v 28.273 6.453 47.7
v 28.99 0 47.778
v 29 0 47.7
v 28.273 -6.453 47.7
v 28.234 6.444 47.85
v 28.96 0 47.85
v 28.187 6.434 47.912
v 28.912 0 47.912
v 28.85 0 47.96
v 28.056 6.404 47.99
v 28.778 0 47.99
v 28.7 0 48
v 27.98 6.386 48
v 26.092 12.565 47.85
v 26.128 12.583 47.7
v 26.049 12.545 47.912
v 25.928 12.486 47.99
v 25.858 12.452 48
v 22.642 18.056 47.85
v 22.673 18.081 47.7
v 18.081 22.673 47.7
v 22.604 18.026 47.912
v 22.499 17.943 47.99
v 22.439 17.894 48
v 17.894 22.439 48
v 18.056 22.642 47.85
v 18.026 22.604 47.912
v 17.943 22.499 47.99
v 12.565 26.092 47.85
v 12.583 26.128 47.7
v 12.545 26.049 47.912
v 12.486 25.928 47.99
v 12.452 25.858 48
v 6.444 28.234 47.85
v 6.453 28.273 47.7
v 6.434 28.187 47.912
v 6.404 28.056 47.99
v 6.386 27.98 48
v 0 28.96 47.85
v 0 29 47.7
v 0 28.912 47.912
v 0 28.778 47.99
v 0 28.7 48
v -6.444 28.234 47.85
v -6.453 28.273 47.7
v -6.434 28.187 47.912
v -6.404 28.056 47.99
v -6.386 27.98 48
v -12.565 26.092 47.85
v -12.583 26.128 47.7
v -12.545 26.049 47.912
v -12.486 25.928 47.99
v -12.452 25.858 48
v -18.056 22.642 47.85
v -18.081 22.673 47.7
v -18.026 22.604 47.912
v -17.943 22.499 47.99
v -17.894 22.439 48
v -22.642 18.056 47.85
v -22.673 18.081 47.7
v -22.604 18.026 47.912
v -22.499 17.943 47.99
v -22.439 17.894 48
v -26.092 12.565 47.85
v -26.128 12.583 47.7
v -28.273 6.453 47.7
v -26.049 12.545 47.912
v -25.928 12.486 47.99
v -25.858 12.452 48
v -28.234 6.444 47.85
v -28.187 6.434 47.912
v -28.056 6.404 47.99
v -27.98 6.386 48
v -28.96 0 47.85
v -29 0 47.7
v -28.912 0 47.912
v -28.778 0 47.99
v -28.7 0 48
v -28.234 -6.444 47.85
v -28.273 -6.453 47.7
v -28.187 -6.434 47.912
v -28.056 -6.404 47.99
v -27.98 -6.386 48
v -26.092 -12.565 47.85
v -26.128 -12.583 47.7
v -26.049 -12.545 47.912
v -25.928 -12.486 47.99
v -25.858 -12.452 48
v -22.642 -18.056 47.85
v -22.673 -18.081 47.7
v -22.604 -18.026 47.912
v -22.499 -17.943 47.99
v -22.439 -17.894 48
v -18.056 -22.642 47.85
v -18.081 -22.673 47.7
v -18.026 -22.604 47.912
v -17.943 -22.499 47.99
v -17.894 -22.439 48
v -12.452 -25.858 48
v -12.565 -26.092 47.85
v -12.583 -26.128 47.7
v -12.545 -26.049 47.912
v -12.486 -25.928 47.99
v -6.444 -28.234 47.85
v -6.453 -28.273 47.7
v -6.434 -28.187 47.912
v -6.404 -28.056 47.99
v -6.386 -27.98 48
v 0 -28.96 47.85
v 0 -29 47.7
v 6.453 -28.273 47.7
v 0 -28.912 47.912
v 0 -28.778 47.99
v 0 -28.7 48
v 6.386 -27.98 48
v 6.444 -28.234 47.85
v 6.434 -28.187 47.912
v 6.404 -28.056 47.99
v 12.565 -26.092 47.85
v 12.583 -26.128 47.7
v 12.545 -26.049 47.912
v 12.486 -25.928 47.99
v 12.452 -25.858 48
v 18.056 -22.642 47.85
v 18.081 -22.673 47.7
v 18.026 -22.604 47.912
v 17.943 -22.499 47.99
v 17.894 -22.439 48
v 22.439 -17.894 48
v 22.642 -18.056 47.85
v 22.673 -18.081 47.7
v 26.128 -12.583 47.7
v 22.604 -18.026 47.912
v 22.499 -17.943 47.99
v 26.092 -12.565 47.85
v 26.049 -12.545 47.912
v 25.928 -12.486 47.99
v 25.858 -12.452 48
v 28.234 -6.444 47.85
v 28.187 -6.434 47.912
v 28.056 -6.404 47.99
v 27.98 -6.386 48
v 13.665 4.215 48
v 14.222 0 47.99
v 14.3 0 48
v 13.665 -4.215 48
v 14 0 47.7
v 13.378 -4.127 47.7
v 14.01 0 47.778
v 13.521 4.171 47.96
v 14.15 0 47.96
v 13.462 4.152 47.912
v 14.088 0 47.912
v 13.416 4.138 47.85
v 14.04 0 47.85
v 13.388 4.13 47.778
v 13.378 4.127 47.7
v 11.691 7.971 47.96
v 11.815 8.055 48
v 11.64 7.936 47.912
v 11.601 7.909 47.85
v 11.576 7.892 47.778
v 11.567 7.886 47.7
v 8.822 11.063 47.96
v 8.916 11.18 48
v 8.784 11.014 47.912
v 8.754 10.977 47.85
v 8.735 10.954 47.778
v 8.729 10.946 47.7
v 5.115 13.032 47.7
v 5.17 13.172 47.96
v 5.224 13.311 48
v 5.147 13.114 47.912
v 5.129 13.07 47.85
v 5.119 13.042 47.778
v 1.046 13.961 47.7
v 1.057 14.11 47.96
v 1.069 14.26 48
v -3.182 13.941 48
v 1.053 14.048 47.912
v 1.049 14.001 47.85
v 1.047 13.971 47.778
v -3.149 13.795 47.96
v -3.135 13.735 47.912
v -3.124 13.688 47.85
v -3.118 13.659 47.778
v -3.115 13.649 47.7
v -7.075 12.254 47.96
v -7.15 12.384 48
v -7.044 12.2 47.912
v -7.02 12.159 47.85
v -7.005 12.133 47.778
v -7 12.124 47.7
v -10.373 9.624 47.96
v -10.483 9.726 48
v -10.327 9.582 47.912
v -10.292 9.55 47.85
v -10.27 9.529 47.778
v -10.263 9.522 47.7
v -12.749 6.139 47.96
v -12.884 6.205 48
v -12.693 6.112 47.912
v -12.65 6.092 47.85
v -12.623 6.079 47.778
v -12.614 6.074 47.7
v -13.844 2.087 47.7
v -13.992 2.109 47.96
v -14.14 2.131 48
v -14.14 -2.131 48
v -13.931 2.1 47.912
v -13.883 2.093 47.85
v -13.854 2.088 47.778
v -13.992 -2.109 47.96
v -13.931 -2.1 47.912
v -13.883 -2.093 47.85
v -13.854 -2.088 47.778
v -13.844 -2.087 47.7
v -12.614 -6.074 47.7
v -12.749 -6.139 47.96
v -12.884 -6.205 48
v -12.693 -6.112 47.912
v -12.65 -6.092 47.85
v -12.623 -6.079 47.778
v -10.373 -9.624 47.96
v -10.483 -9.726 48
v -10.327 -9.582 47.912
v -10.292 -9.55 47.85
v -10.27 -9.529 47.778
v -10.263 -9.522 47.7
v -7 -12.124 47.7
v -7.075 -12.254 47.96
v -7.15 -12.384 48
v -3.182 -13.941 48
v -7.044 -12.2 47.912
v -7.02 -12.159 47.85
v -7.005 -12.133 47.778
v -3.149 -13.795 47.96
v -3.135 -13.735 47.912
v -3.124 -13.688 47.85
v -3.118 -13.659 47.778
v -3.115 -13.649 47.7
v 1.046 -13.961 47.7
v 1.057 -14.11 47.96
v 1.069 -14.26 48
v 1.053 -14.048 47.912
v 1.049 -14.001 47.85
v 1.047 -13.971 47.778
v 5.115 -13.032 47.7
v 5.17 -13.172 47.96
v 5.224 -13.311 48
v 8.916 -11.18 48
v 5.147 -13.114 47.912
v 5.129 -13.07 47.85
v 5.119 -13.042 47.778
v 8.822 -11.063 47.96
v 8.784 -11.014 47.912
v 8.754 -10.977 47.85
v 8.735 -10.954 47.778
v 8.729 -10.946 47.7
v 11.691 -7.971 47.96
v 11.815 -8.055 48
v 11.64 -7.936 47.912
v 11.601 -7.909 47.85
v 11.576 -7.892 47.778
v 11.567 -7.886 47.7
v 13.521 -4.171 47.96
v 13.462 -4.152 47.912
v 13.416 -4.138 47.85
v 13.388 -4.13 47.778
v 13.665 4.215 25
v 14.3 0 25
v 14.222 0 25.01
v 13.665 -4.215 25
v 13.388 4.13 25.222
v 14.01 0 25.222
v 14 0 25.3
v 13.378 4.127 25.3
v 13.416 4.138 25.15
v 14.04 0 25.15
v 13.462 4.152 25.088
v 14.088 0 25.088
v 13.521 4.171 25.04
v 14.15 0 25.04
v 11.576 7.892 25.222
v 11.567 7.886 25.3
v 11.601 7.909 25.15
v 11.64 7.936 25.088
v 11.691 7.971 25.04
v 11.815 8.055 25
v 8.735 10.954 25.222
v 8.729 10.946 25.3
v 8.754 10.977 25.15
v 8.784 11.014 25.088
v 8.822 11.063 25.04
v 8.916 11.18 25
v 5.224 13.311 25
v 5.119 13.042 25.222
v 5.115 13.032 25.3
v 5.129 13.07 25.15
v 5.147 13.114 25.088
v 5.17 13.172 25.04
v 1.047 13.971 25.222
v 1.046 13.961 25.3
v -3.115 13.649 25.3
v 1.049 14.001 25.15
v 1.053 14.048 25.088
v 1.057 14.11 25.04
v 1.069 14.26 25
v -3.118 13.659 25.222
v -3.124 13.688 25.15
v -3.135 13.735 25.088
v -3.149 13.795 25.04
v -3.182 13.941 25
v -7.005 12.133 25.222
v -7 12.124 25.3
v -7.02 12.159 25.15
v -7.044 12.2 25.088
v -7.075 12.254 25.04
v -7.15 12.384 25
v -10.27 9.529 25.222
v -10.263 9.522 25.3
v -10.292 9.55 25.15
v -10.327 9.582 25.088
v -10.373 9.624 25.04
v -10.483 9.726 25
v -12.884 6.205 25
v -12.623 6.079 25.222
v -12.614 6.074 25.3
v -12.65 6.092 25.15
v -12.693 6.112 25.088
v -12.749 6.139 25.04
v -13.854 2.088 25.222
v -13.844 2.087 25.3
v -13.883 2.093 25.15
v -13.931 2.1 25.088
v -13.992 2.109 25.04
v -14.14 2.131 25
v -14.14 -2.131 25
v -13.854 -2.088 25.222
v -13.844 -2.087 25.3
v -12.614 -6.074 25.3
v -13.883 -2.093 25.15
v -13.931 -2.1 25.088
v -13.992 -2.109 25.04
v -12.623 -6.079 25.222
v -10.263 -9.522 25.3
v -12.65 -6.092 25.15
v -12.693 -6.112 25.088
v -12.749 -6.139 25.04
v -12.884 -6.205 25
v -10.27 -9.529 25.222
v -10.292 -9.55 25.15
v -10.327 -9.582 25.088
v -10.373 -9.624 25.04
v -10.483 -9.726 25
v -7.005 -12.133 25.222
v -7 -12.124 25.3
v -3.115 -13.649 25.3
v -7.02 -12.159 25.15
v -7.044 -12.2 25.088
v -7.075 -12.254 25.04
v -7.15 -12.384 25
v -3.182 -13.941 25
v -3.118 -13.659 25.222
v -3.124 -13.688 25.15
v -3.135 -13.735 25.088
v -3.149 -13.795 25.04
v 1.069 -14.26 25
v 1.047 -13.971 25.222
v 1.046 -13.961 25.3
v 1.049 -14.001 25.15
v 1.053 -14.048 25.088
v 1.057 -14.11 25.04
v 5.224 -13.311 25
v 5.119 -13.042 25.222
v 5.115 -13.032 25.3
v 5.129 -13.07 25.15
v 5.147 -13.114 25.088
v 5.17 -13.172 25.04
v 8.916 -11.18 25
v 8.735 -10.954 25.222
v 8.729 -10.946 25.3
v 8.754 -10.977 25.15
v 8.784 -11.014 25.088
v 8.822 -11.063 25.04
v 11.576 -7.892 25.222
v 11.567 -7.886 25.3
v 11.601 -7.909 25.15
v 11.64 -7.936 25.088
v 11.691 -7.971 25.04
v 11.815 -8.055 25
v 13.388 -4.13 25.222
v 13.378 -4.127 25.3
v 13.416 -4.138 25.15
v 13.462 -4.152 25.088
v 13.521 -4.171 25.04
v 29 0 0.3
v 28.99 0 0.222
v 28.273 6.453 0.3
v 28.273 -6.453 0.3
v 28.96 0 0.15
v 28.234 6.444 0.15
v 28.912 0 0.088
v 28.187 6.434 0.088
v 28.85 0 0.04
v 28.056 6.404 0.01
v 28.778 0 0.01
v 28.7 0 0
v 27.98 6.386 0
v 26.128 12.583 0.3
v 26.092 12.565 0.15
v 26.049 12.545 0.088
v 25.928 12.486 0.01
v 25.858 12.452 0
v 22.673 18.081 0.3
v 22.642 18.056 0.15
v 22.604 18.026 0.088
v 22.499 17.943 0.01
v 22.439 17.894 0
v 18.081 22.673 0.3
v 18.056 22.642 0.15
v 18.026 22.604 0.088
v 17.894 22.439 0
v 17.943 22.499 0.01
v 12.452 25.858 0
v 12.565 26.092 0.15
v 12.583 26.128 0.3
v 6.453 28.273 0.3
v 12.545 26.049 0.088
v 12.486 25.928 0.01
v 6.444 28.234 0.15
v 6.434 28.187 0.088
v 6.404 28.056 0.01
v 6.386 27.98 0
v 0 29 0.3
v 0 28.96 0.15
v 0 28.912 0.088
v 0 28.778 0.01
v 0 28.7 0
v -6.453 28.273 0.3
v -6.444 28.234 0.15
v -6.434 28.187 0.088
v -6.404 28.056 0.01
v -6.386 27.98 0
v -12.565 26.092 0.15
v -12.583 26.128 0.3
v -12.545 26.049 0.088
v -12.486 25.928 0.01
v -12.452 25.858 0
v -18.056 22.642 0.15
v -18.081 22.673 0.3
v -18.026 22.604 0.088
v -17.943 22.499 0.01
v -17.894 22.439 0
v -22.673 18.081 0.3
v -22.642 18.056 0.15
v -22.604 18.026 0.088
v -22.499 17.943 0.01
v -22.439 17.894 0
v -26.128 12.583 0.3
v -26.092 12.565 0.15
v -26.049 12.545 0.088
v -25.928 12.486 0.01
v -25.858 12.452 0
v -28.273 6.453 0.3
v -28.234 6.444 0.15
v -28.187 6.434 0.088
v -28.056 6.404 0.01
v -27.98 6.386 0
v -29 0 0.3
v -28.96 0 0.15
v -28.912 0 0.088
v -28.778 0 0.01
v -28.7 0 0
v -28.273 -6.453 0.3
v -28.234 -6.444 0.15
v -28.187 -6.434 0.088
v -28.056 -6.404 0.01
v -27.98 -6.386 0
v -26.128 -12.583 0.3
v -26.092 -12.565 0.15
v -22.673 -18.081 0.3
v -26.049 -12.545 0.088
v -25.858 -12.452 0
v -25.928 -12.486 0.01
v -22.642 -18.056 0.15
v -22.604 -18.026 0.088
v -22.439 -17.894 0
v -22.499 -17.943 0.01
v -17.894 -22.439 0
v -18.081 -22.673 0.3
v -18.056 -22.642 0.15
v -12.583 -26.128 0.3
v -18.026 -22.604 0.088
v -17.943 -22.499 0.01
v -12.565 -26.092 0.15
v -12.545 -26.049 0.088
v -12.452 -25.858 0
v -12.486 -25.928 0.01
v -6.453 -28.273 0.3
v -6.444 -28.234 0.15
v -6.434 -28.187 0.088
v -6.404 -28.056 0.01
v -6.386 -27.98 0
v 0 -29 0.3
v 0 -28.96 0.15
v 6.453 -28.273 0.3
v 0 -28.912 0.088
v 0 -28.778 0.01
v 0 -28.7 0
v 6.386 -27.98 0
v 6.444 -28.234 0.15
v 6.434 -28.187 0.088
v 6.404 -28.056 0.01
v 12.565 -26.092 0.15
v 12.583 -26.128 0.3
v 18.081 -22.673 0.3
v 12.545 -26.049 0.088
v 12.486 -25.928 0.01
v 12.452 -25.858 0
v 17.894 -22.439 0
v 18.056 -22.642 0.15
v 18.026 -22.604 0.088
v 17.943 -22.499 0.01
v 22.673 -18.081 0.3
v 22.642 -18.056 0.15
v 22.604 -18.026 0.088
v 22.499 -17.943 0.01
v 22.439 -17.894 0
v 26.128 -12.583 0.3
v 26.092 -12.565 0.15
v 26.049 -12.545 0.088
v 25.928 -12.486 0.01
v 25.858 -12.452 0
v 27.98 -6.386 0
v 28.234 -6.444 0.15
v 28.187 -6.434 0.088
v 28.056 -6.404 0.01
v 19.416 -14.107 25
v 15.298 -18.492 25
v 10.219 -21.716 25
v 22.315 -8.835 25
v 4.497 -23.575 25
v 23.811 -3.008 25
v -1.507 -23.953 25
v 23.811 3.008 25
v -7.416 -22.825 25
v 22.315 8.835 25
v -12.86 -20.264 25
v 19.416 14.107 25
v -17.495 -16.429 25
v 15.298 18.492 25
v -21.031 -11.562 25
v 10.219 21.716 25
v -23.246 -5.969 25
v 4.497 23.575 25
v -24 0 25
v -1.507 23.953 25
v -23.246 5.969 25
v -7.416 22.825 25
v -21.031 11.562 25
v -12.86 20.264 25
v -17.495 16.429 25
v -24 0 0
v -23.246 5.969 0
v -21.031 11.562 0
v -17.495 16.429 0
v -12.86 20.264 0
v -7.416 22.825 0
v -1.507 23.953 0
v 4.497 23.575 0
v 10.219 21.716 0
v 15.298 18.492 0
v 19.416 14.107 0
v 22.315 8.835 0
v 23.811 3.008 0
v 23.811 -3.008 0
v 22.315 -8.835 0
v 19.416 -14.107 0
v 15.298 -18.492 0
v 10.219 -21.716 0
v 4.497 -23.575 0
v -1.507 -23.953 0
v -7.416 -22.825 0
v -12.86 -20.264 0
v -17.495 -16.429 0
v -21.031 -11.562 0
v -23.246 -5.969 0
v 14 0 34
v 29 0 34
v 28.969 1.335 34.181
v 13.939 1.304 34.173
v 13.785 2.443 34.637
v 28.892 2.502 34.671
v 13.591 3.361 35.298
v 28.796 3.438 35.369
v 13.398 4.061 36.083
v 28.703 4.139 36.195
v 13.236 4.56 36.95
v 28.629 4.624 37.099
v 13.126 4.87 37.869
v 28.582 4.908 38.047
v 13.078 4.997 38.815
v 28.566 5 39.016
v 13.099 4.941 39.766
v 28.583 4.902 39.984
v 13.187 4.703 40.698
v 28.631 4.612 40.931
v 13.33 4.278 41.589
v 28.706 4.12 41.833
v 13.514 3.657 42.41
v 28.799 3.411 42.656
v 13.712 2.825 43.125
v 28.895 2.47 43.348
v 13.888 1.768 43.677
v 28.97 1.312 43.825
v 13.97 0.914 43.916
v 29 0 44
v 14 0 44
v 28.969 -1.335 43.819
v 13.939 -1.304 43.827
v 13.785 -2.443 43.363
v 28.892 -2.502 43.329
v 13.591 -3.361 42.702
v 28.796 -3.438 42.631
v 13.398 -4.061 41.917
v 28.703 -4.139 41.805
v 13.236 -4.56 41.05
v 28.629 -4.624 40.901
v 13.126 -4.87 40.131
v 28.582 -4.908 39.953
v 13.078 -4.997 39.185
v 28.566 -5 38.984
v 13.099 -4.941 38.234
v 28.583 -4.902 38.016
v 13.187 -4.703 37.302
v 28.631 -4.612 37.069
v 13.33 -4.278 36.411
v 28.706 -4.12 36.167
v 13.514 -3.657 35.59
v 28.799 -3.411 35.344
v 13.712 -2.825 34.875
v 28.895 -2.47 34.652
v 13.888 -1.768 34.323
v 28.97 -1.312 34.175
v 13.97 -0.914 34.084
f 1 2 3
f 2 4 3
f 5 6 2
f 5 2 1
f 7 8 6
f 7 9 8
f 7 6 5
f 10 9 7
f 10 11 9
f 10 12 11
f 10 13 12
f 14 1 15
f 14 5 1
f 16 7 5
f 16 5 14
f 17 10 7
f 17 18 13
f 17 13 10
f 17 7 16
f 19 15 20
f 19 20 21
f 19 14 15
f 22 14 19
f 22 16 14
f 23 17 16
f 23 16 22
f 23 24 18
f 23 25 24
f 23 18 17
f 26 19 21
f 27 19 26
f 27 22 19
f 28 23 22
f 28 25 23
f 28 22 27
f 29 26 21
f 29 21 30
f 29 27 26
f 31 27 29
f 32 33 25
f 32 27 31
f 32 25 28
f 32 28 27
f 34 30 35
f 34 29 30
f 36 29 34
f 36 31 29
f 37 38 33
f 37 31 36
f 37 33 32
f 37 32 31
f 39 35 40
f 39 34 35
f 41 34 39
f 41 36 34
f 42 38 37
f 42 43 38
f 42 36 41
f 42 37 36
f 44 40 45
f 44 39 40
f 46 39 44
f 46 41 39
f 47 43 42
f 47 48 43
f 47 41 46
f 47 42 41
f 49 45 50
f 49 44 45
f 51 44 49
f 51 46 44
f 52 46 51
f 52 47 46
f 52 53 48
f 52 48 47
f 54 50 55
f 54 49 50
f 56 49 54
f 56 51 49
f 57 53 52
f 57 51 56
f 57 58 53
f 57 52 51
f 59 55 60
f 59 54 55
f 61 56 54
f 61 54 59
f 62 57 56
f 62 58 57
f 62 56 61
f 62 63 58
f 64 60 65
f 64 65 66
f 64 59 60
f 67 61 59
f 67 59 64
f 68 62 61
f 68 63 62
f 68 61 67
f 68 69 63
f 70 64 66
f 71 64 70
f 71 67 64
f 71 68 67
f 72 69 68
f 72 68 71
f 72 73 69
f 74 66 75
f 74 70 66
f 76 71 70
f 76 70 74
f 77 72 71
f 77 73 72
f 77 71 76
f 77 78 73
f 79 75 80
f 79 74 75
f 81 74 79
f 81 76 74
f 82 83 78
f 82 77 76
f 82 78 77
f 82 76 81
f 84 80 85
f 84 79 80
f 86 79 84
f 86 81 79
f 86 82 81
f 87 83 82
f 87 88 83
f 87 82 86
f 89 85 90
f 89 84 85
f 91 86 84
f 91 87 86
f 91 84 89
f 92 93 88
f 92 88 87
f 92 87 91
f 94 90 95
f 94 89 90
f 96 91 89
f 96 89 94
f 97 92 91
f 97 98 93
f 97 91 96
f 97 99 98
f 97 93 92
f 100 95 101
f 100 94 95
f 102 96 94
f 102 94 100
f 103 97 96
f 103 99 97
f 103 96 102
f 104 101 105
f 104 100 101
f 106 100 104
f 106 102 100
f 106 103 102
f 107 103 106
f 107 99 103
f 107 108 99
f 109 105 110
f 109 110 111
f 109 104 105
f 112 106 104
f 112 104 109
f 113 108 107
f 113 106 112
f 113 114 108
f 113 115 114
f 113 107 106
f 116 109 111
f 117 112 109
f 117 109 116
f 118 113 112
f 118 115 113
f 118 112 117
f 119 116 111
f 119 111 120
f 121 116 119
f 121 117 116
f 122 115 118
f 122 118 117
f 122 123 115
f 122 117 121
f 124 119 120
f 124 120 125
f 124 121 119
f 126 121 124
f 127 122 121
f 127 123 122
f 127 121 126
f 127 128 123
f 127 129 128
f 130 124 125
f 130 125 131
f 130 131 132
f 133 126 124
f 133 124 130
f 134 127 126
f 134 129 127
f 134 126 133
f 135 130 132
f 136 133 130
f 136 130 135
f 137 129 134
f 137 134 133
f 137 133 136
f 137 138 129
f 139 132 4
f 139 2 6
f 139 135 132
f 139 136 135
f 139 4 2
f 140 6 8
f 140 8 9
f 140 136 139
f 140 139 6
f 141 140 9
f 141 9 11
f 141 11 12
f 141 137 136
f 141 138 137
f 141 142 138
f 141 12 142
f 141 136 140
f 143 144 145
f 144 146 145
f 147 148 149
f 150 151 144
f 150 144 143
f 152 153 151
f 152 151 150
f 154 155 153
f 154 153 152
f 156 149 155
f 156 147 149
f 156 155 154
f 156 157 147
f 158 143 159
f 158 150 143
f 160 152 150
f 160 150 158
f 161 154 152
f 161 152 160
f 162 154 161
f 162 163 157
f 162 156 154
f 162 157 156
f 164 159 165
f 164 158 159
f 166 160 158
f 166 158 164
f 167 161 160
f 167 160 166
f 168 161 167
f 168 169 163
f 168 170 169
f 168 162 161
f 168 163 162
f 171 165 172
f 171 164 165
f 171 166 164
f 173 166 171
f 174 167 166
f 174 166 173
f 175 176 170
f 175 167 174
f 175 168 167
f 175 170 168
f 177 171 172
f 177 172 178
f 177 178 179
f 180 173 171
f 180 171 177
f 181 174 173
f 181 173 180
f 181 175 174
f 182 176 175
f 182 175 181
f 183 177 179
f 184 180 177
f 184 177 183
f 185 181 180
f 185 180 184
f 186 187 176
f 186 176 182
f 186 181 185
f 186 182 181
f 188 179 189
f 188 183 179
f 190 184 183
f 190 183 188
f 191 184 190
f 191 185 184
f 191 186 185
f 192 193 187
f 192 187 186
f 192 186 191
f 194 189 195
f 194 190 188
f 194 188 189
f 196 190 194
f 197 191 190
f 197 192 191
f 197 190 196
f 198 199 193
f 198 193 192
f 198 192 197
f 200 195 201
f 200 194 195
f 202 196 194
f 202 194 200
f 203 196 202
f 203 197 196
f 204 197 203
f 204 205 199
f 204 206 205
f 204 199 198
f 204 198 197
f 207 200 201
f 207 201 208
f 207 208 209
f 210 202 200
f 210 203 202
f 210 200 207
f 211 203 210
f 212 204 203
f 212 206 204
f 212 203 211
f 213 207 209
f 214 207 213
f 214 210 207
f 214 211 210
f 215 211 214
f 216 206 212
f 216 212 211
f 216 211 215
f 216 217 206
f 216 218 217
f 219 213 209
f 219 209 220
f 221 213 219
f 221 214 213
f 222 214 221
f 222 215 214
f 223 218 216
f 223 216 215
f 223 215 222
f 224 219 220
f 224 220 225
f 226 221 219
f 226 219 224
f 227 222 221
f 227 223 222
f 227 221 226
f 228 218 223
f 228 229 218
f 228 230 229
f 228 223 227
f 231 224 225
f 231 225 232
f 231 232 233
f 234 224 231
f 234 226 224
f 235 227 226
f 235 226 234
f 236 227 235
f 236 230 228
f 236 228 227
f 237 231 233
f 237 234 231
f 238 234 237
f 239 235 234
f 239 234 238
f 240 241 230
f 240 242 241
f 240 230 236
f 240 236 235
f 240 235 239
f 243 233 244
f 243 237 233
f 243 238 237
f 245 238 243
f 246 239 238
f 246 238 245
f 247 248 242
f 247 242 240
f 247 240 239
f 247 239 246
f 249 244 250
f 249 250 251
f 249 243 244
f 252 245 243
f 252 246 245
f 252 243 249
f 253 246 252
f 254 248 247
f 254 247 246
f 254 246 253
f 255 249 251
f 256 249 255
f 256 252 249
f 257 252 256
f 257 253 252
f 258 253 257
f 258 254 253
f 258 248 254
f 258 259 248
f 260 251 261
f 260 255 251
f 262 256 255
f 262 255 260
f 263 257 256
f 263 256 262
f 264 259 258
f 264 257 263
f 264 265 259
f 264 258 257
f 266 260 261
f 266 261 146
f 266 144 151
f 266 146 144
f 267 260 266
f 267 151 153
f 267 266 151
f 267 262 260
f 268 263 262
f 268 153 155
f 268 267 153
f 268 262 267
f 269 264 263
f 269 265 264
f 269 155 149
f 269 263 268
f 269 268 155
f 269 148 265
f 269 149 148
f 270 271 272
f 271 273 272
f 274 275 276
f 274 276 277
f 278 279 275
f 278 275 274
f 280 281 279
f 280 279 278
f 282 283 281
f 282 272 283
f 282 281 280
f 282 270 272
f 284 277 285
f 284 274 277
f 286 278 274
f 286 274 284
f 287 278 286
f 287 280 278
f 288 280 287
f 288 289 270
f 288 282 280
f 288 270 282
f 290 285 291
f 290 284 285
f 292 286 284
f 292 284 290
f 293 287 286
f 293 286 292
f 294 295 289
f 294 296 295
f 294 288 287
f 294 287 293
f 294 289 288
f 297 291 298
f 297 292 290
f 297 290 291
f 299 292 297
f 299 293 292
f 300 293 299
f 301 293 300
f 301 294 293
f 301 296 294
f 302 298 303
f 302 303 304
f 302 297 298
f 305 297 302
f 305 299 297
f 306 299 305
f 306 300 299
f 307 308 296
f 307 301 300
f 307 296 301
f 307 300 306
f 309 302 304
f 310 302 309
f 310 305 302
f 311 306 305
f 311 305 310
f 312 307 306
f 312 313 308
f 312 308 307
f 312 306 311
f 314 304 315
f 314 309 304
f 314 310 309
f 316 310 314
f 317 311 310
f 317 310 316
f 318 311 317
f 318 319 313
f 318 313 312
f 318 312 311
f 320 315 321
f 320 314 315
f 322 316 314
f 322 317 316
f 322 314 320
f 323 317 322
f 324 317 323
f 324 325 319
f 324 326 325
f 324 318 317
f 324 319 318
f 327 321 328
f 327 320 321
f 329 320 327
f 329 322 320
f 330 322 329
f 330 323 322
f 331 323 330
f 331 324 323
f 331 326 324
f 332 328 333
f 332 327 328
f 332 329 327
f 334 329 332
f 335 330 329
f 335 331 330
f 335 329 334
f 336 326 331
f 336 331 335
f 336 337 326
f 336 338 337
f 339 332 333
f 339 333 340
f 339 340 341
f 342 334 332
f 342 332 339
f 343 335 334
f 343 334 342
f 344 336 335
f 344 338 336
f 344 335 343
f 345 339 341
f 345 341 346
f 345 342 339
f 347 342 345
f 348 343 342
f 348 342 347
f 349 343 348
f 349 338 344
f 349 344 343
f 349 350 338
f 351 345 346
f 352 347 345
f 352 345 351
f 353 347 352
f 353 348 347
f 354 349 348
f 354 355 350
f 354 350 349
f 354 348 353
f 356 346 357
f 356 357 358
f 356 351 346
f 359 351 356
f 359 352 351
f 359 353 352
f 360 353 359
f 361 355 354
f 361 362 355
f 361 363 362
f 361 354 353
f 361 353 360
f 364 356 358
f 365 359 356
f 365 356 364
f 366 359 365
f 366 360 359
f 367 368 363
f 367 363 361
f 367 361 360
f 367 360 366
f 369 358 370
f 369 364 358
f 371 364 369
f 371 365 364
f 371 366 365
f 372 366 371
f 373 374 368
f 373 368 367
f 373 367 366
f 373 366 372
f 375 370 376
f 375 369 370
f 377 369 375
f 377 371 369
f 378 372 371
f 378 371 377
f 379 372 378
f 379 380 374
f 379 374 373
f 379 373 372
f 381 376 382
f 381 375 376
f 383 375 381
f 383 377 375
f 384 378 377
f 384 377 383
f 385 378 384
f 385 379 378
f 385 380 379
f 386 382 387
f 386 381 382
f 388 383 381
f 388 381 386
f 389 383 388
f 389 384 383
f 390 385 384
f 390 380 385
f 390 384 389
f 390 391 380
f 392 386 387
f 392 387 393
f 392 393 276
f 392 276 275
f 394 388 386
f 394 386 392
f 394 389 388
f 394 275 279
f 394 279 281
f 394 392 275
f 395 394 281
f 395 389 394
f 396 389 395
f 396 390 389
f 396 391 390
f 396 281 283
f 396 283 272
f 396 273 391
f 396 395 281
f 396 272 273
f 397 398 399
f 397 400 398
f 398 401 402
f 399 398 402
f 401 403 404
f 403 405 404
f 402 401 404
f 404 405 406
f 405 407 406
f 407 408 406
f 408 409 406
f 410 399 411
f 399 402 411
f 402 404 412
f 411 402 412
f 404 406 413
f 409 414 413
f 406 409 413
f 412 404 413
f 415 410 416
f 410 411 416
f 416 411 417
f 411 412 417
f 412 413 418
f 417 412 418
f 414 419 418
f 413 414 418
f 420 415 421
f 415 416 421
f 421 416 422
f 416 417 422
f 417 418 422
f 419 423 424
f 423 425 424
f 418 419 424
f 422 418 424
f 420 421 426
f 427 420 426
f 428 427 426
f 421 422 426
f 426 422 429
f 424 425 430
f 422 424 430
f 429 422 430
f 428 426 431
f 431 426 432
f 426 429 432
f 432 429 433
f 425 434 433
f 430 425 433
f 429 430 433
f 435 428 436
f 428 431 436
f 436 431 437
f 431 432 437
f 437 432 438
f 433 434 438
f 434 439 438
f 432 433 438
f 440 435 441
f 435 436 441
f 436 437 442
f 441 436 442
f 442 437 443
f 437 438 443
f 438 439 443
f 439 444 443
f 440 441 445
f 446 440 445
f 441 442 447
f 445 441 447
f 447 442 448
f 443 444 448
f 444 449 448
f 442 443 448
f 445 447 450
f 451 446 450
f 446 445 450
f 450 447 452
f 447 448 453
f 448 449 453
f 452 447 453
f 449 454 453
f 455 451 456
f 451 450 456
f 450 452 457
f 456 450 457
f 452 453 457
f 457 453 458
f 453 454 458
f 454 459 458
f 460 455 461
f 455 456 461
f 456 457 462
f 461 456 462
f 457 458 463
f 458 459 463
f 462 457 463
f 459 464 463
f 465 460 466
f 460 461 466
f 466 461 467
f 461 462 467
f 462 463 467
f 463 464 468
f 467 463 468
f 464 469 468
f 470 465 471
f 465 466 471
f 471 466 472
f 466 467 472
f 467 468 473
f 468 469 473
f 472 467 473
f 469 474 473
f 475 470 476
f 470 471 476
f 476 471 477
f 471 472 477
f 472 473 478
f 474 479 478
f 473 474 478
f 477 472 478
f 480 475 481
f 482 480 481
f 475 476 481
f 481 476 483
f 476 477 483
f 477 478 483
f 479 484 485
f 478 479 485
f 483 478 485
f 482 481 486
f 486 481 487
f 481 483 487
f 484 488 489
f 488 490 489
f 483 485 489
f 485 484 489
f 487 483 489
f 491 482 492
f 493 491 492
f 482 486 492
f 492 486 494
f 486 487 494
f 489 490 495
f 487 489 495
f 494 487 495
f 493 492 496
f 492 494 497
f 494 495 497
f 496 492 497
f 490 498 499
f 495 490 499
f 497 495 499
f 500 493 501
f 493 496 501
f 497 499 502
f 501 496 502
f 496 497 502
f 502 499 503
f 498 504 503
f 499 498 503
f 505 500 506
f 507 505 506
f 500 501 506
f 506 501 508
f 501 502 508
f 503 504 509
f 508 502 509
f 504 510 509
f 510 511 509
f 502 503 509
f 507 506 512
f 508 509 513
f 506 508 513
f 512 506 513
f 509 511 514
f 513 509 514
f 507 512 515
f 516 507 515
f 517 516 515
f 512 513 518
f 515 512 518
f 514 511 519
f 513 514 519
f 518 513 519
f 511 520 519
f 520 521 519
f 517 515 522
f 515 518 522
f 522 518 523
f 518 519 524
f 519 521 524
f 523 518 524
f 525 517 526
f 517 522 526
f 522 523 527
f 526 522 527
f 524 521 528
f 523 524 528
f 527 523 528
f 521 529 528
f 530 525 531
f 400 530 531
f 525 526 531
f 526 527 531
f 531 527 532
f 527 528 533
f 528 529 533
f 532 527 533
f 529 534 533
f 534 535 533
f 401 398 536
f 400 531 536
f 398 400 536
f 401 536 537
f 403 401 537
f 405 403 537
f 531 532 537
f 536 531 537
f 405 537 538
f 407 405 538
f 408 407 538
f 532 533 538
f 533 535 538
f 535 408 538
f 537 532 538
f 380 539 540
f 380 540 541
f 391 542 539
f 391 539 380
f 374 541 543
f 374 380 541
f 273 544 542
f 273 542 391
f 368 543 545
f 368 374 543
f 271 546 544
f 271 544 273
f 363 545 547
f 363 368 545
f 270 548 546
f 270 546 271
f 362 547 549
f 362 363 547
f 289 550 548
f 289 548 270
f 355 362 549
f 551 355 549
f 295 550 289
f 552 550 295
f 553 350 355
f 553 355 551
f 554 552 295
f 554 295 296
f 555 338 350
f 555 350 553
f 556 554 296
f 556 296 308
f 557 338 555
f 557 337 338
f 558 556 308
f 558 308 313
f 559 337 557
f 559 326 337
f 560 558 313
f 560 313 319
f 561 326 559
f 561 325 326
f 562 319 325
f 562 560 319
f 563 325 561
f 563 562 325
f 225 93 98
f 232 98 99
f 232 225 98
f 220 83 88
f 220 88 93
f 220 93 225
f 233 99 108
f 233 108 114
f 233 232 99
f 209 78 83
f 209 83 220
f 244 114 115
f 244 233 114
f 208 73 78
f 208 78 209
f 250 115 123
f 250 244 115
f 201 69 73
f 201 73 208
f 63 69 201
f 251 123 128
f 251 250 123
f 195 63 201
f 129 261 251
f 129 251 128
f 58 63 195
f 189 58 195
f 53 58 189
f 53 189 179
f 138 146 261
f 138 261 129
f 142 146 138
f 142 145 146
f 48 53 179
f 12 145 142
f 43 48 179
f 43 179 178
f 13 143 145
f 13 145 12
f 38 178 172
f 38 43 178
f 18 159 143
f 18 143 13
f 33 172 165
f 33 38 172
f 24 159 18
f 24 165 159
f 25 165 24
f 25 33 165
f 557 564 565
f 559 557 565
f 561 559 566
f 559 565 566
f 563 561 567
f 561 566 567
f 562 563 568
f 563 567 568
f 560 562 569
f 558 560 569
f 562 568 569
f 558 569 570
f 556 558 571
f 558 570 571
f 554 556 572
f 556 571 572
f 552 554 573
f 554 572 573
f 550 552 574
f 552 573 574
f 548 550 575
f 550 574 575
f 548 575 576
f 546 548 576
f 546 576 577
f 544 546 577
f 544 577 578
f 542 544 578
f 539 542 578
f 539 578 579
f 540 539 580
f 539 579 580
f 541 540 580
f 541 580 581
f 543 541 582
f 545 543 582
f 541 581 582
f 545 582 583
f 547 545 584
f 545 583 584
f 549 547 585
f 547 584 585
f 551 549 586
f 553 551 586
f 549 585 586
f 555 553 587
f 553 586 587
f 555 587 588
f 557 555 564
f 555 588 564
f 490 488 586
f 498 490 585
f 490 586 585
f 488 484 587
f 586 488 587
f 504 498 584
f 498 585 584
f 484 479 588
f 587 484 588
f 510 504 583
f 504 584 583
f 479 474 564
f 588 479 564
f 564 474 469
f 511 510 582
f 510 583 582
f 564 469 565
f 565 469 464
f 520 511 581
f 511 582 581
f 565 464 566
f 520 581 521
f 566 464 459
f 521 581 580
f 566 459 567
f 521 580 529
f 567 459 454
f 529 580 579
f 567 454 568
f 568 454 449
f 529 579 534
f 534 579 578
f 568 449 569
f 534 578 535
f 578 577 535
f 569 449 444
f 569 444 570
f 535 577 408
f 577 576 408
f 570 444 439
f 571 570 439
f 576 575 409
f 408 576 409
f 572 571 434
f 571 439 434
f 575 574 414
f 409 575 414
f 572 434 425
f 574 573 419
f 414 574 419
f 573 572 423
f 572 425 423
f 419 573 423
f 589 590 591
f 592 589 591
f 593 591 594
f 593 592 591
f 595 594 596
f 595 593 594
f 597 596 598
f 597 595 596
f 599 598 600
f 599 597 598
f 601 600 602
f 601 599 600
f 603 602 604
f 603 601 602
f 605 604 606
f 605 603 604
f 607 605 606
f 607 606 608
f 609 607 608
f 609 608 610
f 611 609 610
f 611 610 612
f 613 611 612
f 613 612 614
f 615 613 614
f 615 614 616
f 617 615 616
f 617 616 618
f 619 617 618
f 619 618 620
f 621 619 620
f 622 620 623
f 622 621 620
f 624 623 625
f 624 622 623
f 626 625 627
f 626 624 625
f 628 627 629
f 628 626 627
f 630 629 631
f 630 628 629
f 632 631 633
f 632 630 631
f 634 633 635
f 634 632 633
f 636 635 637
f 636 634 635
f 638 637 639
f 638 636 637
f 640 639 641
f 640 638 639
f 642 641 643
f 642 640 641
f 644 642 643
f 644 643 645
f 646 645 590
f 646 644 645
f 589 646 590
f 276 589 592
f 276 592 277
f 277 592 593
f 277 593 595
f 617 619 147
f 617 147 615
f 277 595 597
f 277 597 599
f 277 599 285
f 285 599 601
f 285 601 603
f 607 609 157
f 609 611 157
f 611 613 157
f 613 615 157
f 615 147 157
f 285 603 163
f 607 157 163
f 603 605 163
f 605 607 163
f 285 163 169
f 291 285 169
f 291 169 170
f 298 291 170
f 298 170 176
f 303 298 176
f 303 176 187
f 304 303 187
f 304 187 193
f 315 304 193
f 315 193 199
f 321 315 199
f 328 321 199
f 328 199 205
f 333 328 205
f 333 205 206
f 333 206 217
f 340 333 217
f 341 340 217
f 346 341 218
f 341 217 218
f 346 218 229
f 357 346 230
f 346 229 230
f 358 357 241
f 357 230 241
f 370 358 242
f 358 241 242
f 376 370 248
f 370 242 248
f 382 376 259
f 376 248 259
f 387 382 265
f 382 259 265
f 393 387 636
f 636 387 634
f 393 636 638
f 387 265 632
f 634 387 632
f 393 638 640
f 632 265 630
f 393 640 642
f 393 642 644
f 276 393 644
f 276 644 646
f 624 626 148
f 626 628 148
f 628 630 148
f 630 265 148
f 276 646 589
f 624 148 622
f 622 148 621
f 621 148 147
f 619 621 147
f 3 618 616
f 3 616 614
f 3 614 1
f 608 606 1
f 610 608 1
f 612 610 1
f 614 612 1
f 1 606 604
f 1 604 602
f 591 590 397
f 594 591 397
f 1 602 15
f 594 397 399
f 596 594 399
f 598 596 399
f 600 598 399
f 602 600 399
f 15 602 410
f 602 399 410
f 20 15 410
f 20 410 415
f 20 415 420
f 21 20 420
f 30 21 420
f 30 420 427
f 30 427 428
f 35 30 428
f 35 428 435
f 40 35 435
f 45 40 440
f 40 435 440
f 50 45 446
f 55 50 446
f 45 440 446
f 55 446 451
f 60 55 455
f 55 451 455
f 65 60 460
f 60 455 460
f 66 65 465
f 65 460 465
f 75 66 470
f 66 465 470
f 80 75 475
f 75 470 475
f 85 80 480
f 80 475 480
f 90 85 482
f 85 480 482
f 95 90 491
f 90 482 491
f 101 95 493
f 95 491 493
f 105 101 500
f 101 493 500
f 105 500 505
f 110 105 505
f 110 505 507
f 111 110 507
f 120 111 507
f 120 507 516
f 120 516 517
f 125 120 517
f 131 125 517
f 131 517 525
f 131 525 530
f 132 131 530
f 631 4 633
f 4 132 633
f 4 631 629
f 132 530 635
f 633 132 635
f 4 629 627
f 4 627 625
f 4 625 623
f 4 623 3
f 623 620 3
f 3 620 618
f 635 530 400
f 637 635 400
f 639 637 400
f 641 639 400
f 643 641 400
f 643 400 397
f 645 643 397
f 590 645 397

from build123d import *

# Parameters (mm, degrees)
SKETCH4_R               = 29
BOSS_EXTRUDE1_DEPTH     = 48
SKETCH5_R               = 24
CUT_EXTRUDE1_DEPTH      = 25
SKETCH6_R               = 14
CUT_EXTRUDE2_DEPTH      = 1
CUT_EXTRUDE2_DEPTH_BACK = 49
SKETCH7_R               = 5
CUT_EXTRUDE3_DEPTH      = 42
FILLET1_R               = 0.3


with BuildPart() as part:
    # Sketch4 → Boss-Extrude1 (new body)
    with BuildSketch(Plane.XY):
        Circle(SKETCH4_R)
    extrude(amount=BOSS_EXTRUDE1_DEPTH)

    # Sketch5 → Cut-Extrude1 (cut)
    with BuildSketch(Plane(origin=(0, 0, 0), x_dir=(-1, 0, 0), z_dir=(0, 0, -1))):
        Circle(SKETCH5_R)
    extrude(amount=-CUT_EXTRUDE1_DEPTH, mode=Mode.SUBTRACT)

    # Sketch6 → Cut-Extrude2 (cut, two sides)
    with BuildSketch(Plane.XY.offset(48)) as cut_extrude2_sk:
        Circle(SKETCH6_R)
    extrude(amount=CUT_EXTRUDE2_DEPTH, mode=Mode.SUBTRACT)
    extrude(cut_extrude2_sk.sketch, amount=-CUT_EXTRUDE2_DEPTH_BACK, mode=Mode.SUBTRACT)

    # Sketch7 → Cut-Extrude3 (cut)
    with BuildSketch(Plane(origin=(0, 0, 0), x_dir=(0, 0, -1), z_dir=(1, 0, 0))):
        with Locations((-39, 0)):
            Circle(SKETCH7_R)
    extrude(amount=CUT_EXTRUDE3_DEPTH, mode=Mode.SUBTRACT)

    # Fillet1
    fillet1_edges = [part.edges().sort_by_distance(p)[0] for p in [
        (-14, 0, 48),
        (-14, 0, 25),
        (-29, 0, 0),
        (-29, 0, 48),
    ]]
    fillet(fillet1_edges, radius=FILLET1_R)


solid = part.part
